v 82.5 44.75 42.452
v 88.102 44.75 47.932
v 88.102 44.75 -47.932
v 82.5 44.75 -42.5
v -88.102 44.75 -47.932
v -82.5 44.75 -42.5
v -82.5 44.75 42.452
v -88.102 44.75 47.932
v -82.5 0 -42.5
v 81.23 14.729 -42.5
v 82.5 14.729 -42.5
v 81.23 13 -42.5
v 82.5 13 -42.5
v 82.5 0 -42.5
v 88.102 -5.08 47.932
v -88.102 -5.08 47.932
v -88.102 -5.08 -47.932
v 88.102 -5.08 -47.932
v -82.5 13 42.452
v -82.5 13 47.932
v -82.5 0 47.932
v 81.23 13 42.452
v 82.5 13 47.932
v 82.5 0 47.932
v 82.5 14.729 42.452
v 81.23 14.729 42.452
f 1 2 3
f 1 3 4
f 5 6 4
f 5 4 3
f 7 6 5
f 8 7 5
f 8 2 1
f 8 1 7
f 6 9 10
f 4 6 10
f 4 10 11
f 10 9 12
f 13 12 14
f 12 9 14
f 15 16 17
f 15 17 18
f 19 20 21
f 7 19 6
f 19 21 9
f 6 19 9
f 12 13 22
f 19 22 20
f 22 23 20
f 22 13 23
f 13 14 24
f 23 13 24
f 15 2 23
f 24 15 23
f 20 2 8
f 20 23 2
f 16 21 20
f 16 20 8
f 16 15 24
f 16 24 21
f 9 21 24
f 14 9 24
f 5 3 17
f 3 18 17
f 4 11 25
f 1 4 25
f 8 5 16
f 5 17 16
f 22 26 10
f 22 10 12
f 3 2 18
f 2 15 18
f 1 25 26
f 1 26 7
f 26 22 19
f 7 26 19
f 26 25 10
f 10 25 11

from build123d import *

# Parameters (mm, degrees)
F0_W     = 165
F0_H     = 5.432152
F0_H_2   = 85
F1_DEPTH = 5.08
F2_DEPTH = 13
F3_W     = 165
F3_H     = 5.479902
F4_DEPTH = 31.75
F6_DEPTH = 1.27


with BuildPart() as f1:
    # F0 (on Front) → F1 (new body)
    with BuildSketch(Plane.XZ):
        with Locations((0, 45.216076)):
            Rectangle(F0_W, F0_H)
        Rectangle(F0_W, F0_H_2)
        Polygon((82.5, 47.932152), (82.5, 42.5), (82.5, -42.5), (-82.5, -42.5), (-82.5, 42.5), (-82.5, 47.932152), (-88.101894, 47.932152), (-88.101894, -47.932152), (88.101894, -47.932152), (88.101894, 47.932152), align=None)
    extrude(amount=F1_DEPTH)

    # F0 (on Front) → F2 (join)
    with BuildSketch(Plane.XZ):
        Polygon((82.5, 47.932152), (82.5, 42.5), (82.5, -42.5), (-82.5, -42.5), (-82.5, 42.5), (-82.5, 47.932152), (-88.101894, 47.932152), (-88.101894, -47.932152), (88.101894, -47.932152), (88.101894, 47.932152), align=None)
    extrude(amount=-F2_DEPTH)

    # F3 (on face) → F4 (join)
    with BuildSketch(Plane(origin=(0, 13, 0), x_dir=(-1, 0, 0), z_dir=(0, 1, 0))):
        Polygon((82.5, 47.932152), (82.5, 42.45225), (82.5, -42.45225), (82.5, -42.5), (-82.5, -42.5), (-82.5, -42.45225), (-82.5, 42.45225), (-82.5, 47.932152), (-88.101894, 47.932152), (-88.101894, -47.932152), (88.101894, -47.932152), (88.101894, 47.932152), align=None)
        with Locations((0, 45.192201)):
            Rectangle(F3_W, F3_H)
    extrude(amount=F4_DEPTH)

    # F5 (on face) → F6 (join)
    with BuildSketch(Plane(origin=(82.5, 0, 0), x_dir=(0, -1, 0), z_dir=(-1, 0, 0))):
        Polygon((-13, -30.489394), (-13, 42.45225), (-14.72871, 42.45225), (-14.72871, -42.5), (-13, -42.5), align=None)
    extrude(amount=F6_DEPTH)


solid = f1.part
